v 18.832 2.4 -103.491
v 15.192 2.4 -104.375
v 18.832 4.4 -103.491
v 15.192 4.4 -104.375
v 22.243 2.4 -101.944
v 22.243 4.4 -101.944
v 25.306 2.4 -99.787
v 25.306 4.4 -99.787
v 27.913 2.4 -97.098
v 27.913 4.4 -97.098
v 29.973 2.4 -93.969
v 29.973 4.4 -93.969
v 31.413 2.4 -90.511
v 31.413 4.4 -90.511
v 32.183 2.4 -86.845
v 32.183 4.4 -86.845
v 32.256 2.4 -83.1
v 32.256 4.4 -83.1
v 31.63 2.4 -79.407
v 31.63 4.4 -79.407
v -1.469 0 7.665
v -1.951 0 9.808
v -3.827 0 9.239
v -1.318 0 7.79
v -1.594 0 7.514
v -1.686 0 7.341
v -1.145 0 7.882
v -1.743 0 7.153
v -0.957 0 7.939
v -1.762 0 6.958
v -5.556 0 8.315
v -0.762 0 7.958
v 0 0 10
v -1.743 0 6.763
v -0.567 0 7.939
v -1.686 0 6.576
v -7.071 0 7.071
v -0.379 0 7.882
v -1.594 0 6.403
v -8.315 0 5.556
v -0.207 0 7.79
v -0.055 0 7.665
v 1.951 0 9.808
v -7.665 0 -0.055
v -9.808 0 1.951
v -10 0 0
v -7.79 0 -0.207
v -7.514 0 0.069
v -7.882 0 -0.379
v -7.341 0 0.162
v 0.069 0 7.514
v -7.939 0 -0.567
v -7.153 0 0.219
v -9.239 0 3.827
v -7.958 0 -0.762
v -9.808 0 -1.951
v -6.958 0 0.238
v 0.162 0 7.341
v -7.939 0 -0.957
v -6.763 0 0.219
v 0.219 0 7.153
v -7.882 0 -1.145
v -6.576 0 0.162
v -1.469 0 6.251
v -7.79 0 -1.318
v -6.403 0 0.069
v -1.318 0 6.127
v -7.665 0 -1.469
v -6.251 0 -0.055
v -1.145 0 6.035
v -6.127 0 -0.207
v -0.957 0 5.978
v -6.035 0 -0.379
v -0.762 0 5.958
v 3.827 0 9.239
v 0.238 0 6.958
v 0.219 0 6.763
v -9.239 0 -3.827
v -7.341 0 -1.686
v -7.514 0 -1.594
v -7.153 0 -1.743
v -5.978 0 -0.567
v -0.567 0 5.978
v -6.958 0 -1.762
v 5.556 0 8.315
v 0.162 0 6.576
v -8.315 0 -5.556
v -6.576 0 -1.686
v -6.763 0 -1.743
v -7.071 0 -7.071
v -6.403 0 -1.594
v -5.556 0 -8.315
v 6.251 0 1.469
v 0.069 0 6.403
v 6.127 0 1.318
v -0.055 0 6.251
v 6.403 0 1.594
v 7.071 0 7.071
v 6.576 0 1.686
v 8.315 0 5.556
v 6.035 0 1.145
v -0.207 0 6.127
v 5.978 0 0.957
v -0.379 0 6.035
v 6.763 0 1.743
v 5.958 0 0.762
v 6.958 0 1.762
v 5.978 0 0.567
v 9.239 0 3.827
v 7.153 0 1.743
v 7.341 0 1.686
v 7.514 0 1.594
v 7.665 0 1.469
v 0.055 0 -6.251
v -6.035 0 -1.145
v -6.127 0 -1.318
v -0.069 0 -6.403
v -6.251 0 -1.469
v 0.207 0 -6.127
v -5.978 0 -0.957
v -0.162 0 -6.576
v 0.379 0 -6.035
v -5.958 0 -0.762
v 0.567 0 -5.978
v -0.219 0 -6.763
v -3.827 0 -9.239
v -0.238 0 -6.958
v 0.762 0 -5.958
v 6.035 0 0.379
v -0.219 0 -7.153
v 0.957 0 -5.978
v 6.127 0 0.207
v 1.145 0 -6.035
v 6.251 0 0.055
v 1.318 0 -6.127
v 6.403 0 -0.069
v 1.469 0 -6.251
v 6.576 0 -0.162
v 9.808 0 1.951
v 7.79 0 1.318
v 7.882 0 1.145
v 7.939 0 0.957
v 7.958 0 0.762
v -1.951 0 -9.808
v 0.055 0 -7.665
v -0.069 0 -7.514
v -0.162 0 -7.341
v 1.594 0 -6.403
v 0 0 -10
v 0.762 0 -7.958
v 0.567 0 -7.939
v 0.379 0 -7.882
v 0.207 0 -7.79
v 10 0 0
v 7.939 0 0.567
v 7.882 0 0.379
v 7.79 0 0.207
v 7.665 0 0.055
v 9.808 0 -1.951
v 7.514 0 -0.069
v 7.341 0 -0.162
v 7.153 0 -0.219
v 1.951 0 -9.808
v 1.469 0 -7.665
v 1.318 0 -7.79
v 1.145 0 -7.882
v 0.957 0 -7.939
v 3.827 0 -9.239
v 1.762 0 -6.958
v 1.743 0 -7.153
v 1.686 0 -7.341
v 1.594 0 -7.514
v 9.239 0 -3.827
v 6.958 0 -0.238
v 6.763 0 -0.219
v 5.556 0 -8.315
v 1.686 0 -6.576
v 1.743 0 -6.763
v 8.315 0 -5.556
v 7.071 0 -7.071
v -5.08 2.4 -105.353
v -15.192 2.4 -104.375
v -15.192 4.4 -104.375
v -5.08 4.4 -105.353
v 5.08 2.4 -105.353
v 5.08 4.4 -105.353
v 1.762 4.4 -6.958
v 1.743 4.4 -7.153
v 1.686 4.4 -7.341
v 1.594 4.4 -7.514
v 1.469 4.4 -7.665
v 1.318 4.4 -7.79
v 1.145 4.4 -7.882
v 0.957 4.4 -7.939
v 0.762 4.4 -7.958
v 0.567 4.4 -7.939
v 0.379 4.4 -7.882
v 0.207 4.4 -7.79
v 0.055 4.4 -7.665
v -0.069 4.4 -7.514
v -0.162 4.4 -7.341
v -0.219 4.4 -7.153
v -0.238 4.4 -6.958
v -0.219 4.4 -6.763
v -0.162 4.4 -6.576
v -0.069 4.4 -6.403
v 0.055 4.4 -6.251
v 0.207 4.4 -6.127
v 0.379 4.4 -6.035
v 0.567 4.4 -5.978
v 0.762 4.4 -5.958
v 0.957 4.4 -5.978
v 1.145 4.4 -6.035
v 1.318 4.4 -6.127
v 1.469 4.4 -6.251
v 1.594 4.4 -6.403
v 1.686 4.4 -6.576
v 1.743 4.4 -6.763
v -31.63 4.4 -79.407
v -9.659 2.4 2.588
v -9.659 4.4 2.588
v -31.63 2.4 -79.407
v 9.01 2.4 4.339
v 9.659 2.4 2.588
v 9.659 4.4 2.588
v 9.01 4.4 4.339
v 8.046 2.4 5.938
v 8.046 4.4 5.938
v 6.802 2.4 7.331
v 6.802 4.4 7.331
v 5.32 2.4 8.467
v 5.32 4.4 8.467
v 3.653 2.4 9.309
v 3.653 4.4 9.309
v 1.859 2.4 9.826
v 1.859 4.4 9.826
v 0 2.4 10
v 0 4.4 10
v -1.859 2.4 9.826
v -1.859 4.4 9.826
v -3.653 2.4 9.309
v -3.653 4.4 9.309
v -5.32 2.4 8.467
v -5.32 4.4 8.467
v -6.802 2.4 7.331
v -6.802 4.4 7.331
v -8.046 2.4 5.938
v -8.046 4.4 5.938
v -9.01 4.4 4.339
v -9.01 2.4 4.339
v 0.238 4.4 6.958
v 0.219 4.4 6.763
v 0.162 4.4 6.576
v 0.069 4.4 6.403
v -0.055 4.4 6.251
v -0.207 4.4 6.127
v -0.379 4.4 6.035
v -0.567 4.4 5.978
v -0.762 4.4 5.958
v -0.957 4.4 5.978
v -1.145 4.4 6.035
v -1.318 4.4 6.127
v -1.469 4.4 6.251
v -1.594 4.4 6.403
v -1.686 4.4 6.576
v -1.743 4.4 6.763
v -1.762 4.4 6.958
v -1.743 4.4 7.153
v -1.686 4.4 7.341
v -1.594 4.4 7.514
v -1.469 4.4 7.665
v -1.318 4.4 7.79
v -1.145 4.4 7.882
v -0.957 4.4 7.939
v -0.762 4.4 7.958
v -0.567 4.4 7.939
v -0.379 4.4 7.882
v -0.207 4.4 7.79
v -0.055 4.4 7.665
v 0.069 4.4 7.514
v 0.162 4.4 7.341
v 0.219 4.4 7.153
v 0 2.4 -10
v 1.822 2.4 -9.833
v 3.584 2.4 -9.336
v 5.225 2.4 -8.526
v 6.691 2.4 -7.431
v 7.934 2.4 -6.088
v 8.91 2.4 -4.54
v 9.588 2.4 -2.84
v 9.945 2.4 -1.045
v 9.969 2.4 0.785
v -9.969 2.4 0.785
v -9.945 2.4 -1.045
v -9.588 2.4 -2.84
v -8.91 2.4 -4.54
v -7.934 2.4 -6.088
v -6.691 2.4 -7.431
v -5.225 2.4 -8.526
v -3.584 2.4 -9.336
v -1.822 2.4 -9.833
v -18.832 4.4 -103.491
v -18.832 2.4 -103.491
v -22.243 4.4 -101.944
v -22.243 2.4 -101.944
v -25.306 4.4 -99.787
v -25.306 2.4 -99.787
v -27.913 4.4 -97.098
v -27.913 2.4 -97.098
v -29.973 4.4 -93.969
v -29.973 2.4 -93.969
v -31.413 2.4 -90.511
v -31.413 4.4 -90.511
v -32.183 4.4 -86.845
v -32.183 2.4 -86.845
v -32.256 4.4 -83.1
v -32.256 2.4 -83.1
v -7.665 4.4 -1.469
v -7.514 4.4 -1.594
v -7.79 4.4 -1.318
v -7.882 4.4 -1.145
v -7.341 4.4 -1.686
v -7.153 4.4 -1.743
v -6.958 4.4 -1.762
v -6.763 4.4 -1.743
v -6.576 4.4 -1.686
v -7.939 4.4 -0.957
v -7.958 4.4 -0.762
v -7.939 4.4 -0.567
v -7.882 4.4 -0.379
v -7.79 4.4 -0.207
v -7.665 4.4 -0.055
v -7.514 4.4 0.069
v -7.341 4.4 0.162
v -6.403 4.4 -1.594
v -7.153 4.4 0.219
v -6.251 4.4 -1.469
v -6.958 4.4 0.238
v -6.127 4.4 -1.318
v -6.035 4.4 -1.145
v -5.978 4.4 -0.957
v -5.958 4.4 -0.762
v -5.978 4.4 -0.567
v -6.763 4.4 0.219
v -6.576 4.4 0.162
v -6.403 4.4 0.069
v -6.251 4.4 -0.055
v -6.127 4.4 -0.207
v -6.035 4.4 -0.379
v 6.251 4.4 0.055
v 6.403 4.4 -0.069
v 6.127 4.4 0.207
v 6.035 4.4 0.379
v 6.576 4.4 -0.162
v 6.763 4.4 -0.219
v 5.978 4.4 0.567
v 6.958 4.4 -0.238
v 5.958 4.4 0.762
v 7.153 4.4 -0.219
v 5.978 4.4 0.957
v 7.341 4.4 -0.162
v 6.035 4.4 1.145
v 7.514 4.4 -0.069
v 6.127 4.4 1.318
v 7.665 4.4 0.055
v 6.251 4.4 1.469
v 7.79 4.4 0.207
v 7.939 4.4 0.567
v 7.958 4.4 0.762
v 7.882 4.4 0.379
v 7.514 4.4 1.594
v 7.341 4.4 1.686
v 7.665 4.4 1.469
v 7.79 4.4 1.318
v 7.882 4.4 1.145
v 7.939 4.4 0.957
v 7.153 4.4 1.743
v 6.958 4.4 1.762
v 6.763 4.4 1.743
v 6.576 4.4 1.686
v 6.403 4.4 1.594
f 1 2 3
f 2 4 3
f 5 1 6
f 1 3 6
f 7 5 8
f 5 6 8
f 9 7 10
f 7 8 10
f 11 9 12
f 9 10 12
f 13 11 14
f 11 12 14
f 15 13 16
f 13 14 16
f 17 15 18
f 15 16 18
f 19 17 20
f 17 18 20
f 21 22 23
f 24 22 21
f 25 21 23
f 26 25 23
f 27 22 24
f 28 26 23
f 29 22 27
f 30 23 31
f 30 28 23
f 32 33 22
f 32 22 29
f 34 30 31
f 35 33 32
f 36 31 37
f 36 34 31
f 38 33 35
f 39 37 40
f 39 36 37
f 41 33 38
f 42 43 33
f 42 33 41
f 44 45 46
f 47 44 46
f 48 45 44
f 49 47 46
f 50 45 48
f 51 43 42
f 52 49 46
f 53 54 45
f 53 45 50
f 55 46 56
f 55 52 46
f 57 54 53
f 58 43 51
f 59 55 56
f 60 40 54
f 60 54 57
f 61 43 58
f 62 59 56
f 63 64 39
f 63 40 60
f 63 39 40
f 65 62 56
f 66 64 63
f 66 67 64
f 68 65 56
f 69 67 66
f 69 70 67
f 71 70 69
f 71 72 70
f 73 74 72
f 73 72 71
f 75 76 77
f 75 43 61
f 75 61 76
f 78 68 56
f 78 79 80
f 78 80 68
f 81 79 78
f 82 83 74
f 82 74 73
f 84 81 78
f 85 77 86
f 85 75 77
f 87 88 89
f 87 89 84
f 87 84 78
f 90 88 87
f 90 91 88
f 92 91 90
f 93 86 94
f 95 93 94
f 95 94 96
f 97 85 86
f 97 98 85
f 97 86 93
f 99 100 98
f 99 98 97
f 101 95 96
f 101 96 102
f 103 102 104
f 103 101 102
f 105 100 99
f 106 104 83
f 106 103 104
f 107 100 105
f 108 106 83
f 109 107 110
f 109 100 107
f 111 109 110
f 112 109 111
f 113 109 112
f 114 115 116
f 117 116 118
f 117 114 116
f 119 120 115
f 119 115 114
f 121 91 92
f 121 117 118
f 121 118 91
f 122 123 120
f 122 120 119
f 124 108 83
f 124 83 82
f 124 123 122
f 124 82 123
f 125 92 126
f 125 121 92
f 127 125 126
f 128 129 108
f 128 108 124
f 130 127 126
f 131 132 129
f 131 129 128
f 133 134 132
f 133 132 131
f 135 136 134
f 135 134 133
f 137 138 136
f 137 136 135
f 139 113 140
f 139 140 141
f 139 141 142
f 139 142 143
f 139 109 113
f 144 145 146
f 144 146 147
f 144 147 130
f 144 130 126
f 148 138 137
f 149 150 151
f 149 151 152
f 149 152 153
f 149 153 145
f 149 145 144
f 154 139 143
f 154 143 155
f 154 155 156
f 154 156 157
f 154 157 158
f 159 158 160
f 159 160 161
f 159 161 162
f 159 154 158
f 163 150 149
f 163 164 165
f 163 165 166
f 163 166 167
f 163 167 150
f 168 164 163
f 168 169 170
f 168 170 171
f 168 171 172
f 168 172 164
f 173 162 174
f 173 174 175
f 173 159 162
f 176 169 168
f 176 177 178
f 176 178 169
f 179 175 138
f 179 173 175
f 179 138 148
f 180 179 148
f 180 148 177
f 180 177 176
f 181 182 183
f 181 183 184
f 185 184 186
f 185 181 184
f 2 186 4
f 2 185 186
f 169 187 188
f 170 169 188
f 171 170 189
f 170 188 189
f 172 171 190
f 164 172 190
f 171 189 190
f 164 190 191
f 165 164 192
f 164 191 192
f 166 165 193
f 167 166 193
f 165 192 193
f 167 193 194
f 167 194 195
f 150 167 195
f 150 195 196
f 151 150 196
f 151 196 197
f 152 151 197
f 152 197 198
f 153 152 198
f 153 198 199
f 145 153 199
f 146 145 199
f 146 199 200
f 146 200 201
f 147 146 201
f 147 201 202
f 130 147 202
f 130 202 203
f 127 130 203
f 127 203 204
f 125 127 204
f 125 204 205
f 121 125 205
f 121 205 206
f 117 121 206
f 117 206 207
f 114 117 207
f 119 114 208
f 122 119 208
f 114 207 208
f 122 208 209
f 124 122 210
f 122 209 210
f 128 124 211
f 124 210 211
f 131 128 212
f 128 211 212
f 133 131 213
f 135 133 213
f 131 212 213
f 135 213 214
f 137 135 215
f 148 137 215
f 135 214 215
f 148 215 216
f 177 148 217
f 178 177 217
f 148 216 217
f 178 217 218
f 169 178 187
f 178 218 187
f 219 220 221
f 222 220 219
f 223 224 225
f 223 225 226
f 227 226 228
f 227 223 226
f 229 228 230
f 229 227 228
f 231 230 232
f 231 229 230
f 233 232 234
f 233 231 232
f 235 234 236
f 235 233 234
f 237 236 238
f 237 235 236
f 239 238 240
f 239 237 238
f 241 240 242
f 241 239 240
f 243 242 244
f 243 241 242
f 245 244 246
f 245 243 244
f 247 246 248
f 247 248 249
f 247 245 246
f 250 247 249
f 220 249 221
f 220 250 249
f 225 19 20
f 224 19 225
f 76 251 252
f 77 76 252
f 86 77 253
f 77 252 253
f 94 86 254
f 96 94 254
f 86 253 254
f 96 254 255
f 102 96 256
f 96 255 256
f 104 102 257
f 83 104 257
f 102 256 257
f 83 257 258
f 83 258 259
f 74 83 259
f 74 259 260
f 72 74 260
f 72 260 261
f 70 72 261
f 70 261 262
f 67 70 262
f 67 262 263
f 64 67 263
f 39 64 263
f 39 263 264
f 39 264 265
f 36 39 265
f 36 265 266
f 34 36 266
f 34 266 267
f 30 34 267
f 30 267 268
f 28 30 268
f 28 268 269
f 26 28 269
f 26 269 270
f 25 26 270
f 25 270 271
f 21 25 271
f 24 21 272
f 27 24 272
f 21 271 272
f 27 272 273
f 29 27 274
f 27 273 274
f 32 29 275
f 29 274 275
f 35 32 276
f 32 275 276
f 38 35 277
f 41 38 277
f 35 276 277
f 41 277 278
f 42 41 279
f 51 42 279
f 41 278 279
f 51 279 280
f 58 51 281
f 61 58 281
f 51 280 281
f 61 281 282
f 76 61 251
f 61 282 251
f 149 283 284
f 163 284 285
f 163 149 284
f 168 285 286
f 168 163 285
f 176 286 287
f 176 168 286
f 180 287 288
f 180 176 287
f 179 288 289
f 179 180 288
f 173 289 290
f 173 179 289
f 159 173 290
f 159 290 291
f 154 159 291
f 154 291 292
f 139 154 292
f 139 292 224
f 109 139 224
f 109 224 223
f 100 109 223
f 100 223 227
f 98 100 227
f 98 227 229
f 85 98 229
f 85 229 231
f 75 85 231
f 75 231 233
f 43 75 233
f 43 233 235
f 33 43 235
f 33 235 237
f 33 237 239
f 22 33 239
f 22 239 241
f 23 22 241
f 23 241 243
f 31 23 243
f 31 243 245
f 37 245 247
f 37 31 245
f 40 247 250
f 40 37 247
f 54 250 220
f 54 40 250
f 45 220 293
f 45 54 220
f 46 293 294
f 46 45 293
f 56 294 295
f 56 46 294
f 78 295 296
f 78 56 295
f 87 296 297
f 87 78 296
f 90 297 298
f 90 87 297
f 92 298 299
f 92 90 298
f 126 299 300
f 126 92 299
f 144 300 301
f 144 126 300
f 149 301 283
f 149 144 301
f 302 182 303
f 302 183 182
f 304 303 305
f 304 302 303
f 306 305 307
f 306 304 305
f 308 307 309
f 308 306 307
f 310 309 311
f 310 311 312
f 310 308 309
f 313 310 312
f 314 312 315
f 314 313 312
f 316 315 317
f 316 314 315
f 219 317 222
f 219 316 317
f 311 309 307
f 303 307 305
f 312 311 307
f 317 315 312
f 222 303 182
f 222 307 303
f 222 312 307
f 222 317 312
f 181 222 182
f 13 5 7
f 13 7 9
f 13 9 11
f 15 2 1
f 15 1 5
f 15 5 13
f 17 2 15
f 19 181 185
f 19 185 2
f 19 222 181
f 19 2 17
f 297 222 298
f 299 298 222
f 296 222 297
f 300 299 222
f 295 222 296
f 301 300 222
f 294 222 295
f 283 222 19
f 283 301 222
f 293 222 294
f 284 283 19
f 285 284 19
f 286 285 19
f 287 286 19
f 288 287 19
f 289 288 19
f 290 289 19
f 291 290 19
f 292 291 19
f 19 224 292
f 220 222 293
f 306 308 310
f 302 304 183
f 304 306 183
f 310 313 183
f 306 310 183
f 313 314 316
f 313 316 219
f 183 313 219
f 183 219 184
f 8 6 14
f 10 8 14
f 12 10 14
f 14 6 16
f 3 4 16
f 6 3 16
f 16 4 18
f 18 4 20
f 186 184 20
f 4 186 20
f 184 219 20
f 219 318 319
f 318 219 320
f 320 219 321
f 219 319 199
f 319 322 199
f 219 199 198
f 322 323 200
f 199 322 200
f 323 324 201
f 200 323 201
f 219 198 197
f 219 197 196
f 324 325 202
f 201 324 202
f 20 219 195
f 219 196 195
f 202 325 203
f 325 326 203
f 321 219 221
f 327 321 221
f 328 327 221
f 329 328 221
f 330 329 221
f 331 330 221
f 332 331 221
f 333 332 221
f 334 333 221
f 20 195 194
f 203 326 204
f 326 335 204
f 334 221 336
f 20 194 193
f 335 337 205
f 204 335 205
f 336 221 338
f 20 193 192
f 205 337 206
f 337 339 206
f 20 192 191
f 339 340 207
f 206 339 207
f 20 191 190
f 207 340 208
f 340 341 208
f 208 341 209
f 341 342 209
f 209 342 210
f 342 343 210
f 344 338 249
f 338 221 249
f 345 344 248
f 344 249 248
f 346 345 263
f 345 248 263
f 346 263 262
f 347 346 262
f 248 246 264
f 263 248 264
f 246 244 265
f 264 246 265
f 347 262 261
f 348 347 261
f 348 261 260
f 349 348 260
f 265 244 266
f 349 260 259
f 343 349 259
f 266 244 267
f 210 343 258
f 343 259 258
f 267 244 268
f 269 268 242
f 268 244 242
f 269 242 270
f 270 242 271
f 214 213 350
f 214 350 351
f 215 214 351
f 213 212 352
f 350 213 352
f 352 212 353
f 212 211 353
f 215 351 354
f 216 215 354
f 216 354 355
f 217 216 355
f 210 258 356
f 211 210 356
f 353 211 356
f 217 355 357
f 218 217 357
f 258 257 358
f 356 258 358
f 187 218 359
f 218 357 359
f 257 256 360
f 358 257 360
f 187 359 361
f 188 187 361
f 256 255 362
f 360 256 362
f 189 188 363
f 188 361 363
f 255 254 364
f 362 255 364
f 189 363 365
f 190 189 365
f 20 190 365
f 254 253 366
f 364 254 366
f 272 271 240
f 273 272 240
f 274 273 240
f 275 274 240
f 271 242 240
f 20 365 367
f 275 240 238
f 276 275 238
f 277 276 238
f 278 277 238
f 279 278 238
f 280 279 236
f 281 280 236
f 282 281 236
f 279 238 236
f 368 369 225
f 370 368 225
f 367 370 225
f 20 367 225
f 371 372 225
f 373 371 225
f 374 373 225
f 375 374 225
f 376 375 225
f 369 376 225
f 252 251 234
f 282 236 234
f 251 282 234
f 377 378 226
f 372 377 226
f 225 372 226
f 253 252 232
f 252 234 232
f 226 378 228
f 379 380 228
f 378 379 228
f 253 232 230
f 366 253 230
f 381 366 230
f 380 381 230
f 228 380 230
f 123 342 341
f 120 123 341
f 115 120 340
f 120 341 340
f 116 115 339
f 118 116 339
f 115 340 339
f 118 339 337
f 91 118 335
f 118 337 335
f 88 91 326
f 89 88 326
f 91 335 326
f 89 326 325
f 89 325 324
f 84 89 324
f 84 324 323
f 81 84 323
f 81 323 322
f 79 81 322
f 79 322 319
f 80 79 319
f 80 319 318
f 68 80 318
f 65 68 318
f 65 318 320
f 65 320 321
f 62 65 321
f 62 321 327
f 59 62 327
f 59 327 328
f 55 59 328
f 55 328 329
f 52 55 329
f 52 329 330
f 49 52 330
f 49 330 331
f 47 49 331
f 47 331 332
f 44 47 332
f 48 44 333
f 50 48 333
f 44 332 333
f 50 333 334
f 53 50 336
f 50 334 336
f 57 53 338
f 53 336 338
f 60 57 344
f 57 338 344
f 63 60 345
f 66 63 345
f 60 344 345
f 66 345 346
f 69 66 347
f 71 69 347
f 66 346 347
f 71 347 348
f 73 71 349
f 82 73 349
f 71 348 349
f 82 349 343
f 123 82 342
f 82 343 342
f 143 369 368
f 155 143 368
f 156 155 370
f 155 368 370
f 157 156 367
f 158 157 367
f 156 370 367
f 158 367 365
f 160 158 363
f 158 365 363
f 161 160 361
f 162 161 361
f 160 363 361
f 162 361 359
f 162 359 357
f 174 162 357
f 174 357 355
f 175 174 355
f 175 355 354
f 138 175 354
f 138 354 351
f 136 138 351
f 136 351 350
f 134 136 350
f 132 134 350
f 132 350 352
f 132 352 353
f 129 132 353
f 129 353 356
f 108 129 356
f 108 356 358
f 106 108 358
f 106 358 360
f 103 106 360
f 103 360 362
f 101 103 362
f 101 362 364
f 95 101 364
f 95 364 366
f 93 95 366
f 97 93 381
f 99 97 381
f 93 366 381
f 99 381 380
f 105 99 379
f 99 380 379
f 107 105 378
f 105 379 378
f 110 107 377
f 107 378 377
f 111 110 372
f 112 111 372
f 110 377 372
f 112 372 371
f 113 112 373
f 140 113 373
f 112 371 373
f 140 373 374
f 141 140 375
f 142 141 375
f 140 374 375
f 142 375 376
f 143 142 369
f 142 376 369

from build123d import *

# Parameters (mm, degrees)
EXTRUDE_1_DEPTH       = 2
EXTRUDE_START         = 2.4
SKETCH_2_R            = 10
EXTRUDE_2_DEPTH       = 2.4
HOLE_WIZARD_2_0_2_1_D = 2
FILLET_1_R            = 20


with BuildPart() as part:
    # 草图1 → 凸台-拉伸1 (new body)
    with BuildSketch(Plane.XZ.offset(-2.4)):
        with BuildLine():
            Line((36.835257999, -98.834021309), (9.659258263, 2.588190451))
            ThreePointArc((9.659258263, 2.588190451), (0, 10), (-9.659258263, 2.588190451))
            Line((-9.659258263, 2.588190451), (-36.835257999, -98.834021309))
            ThreePointArc((-36.835257999, -98.834021309), (0, -105.475115549), (36.835257999, -98.834021309))
        make_face()
    extrude(amount=-EXTRUDE_1_DEPTH)

    # 草图2 → 凸台-拉伸2 (add)
    with BuildSketch(Plane.XZ.offset(-2.4).offset(EXTRUDE_START)):
        with Locations(Location((0, 0, 0), (0, 0, 270))):
            Circle(SKETCH_2_R)
    extrude(amount=-EXTRUDE_2_DEPTH)

    # Ø2.0 (2) 直径孔1 (through all)
    with Locations(Plane(origin=(0, 0, 0), x_dir=(-1, 0, 0), z_dir=(0, -1, 0))):
        with Locations((-6.958391143, -0.762097571), (-0.762097571, 6.958391143), (0.762097571, -6.958391143), (6.958391143, 0.762097571)):
            Hole(HOLE_WIZARD_2_0_2_1_D / 2)

    # 圆角1
    fillet_1_edges = [part.edges().sort_by_distance(p)[0] for p in [
        (-36.835257999, 3.4, -98.834021309),
        (36.835257999, 3.4, -98.834021309),
    ]]
    fillet(fillet_1_edges, radius=FILLET_1_R)


solid = part.part
